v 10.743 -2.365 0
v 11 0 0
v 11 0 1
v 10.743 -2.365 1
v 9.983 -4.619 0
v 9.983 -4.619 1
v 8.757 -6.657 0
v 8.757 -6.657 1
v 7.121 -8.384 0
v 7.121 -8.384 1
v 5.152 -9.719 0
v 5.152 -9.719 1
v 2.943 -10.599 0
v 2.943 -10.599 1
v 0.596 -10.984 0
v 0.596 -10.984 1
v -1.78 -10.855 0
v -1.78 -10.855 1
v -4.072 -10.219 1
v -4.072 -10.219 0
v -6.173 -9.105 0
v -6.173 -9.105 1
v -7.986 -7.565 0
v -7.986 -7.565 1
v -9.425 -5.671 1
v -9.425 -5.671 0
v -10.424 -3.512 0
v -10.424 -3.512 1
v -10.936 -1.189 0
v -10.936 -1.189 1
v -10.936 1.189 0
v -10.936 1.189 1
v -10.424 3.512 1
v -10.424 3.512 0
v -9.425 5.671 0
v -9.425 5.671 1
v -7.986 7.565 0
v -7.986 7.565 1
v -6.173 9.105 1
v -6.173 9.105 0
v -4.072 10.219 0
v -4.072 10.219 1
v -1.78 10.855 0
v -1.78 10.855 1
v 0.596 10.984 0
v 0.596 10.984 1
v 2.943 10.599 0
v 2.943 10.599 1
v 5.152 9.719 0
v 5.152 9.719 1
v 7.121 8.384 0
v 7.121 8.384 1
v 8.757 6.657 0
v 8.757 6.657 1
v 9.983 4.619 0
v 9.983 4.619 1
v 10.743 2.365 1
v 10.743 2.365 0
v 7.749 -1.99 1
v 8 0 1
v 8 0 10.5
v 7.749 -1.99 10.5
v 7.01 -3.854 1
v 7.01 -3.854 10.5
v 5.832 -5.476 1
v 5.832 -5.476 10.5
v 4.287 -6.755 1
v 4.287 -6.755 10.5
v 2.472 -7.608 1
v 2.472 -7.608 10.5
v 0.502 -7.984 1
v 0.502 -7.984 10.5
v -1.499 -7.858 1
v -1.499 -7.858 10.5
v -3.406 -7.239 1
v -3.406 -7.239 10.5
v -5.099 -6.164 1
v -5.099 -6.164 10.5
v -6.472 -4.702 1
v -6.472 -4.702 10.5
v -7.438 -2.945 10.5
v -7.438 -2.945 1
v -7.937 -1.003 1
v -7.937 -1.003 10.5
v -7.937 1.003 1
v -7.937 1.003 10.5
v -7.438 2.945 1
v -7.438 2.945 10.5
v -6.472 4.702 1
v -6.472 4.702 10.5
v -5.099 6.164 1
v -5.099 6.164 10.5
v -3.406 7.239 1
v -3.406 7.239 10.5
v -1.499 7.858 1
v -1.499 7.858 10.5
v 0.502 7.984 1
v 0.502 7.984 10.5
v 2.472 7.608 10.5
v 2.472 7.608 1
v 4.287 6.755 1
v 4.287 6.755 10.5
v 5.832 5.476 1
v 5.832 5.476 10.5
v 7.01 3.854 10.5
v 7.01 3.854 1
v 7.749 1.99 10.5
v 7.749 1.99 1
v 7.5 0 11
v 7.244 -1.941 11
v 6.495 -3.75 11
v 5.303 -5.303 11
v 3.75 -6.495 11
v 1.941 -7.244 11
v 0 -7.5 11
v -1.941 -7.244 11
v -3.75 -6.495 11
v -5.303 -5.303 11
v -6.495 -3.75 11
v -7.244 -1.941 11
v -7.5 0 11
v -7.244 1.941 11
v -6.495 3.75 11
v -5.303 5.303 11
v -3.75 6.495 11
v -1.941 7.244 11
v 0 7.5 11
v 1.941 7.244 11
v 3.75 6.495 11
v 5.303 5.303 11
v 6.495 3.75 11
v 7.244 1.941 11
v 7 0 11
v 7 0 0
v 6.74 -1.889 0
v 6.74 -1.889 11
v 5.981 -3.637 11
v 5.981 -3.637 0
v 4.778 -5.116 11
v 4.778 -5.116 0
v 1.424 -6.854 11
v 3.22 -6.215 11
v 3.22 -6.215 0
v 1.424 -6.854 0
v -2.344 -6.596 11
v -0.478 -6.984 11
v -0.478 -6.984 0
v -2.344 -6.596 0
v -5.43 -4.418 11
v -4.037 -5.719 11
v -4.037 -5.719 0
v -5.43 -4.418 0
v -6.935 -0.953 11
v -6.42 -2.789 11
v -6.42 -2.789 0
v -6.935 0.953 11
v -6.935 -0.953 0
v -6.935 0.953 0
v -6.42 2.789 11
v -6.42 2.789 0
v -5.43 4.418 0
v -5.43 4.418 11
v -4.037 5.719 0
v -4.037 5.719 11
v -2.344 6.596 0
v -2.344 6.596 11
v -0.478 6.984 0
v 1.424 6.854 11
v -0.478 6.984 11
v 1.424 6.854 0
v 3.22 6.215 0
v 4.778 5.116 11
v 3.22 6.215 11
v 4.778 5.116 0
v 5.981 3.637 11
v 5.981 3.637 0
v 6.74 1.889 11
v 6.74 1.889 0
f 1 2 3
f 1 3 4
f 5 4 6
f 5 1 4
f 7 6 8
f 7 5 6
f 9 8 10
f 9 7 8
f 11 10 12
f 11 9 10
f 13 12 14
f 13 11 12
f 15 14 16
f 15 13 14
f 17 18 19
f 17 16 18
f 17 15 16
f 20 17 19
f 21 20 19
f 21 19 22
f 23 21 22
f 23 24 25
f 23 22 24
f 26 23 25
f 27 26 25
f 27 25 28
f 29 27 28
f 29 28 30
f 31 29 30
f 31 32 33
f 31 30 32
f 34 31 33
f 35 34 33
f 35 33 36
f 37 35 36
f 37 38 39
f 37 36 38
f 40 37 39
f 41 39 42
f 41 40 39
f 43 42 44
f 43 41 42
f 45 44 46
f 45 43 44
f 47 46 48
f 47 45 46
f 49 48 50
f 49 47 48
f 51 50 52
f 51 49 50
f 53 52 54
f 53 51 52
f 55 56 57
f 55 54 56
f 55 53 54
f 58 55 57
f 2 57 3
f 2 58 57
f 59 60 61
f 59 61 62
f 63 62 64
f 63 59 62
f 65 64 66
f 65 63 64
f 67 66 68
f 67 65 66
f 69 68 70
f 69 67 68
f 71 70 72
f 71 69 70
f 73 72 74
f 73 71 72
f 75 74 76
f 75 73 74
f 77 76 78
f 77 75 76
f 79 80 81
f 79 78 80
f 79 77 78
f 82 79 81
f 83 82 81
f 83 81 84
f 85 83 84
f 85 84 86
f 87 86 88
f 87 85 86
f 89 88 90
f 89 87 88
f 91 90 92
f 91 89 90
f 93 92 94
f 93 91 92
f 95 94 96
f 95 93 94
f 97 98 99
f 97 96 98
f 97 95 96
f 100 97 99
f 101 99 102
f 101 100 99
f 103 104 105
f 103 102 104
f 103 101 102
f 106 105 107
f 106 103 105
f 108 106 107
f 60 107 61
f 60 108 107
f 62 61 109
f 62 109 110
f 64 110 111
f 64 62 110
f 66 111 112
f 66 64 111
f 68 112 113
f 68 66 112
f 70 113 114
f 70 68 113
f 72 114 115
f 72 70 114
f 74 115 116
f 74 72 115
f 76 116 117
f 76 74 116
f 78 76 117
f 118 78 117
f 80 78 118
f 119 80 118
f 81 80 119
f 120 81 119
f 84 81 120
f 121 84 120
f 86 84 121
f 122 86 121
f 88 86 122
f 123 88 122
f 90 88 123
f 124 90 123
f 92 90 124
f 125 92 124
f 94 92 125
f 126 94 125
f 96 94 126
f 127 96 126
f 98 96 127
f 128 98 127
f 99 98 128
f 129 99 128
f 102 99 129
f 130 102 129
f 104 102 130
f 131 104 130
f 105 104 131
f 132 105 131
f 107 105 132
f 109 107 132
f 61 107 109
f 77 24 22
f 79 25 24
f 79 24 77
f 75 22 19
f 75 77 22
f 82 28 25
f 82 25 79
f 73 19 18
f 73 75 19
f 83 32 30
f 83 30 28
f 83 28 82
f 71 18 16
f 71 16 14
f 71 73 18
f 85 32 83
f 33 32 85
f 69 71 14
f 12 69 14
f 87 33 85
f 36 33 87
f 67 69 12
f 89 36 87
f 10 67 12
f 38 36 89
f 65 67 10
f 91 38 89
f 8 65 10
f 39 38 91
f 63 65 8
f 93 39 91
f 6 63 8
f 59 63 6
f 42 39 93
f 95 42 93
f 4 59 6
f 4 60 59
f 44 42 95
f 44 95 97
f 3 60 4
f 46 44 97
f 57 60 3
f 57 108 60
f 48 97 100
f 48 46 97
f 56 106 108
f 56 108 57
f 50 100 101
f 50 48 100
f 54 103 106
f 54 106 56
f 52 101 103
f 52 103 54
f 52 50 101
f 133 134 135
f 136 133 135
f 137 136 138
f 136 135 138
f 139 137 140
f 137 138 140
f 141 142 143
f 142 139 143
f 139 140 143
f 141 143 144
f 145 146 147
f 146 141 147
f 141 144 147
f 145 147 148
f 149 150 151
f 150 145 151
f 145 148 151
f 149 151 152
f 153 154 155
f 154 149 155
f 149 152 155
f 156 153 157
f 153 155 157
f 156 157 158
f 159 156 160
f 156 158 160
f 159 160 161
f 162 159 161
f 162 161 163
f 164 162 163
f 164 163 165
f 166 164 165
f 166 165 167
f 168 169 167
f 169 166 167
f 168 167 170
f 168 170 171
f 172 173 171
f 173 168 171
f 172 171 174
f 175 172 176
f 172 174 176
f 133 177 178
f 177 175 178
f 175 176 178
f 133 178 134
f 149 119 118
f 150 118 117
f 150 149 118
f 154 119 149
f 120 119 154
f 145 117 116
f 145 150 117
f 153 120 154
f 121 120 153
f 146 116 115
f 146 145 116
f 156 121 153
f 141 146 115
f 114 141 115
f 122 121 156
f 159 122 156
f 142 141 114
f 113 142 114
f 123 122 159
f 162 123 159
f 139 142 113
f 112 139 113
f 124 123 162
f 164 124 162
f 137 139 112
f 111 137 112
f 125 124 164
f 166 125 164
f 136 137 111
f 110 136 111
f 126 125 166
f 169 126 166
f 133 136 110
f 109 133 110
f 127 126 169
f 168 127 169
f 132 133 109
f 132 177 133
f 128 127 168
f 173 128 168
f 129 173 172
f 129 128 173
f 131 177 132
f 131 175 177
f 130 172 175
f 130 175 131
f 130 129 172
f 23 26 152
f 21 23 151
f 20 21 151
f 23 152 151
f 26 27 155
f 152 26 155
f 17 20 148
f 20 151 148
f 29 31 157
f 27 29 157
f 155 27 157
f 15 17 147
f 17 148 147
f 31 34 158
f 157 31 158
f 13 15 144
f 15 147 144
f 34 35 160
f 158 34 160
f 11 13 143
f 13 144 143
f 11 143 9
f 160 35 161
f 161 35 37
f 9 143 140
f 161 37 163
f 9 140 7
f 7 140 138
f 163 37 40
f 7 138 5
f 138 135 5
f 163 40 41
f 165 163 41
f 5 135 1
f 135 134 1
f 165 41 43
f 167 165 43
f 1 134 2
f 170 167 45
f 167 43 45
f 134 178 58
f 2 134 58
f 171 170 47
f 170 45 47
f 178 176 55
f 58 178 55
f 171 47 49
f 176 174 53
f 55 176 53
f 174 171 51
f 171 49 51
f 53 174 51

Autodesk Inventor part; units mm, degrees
ref_plane "YZ Plane" through (0, 0, 0) normal (1, 0, 0) x (0, 1, 0)
ref_plane "XZ Plane" through (0, 0, 0) normal (0, 1, 0) x (-1, 0, 0)
ref_plane "XY Plane" through (0, 0, 0) normal (0, 0, 1) x (1, 0, 0)
sketch "スケッチ1" plane through (0, 0, 0) normal (0, 0, 1) x (1, 0, 0)
  circle A0 centre (0, 0) radius 7
  circle A1 centre (0, 0) radius 11
  dimension "d0" = 14
  dimension "d1" = 22
extrude "押し出し1" add sketch "スケッチ1" along normal blind 1
sketch "スケッチ2" plane through (0, 0, 1) normal (0, 0, 1) x (1, 0, 0)
  circle A0 centre (0, 0) radius 8
  circle A1 centre (0, 0) radius 11 projected
  circle A2 centre (0, 0) radius 7 projected
  dimension "d4" = 16
extrude "押し出し2" add sketch "スケッチ2" along normal blind 10 contours A0
chamfer "面取り1" distance 0.5 angle 45 1 edges at (-8, 0, 11)
properties part number "オイレスw5f10-12a" material "アセタール樹脂、黒"
